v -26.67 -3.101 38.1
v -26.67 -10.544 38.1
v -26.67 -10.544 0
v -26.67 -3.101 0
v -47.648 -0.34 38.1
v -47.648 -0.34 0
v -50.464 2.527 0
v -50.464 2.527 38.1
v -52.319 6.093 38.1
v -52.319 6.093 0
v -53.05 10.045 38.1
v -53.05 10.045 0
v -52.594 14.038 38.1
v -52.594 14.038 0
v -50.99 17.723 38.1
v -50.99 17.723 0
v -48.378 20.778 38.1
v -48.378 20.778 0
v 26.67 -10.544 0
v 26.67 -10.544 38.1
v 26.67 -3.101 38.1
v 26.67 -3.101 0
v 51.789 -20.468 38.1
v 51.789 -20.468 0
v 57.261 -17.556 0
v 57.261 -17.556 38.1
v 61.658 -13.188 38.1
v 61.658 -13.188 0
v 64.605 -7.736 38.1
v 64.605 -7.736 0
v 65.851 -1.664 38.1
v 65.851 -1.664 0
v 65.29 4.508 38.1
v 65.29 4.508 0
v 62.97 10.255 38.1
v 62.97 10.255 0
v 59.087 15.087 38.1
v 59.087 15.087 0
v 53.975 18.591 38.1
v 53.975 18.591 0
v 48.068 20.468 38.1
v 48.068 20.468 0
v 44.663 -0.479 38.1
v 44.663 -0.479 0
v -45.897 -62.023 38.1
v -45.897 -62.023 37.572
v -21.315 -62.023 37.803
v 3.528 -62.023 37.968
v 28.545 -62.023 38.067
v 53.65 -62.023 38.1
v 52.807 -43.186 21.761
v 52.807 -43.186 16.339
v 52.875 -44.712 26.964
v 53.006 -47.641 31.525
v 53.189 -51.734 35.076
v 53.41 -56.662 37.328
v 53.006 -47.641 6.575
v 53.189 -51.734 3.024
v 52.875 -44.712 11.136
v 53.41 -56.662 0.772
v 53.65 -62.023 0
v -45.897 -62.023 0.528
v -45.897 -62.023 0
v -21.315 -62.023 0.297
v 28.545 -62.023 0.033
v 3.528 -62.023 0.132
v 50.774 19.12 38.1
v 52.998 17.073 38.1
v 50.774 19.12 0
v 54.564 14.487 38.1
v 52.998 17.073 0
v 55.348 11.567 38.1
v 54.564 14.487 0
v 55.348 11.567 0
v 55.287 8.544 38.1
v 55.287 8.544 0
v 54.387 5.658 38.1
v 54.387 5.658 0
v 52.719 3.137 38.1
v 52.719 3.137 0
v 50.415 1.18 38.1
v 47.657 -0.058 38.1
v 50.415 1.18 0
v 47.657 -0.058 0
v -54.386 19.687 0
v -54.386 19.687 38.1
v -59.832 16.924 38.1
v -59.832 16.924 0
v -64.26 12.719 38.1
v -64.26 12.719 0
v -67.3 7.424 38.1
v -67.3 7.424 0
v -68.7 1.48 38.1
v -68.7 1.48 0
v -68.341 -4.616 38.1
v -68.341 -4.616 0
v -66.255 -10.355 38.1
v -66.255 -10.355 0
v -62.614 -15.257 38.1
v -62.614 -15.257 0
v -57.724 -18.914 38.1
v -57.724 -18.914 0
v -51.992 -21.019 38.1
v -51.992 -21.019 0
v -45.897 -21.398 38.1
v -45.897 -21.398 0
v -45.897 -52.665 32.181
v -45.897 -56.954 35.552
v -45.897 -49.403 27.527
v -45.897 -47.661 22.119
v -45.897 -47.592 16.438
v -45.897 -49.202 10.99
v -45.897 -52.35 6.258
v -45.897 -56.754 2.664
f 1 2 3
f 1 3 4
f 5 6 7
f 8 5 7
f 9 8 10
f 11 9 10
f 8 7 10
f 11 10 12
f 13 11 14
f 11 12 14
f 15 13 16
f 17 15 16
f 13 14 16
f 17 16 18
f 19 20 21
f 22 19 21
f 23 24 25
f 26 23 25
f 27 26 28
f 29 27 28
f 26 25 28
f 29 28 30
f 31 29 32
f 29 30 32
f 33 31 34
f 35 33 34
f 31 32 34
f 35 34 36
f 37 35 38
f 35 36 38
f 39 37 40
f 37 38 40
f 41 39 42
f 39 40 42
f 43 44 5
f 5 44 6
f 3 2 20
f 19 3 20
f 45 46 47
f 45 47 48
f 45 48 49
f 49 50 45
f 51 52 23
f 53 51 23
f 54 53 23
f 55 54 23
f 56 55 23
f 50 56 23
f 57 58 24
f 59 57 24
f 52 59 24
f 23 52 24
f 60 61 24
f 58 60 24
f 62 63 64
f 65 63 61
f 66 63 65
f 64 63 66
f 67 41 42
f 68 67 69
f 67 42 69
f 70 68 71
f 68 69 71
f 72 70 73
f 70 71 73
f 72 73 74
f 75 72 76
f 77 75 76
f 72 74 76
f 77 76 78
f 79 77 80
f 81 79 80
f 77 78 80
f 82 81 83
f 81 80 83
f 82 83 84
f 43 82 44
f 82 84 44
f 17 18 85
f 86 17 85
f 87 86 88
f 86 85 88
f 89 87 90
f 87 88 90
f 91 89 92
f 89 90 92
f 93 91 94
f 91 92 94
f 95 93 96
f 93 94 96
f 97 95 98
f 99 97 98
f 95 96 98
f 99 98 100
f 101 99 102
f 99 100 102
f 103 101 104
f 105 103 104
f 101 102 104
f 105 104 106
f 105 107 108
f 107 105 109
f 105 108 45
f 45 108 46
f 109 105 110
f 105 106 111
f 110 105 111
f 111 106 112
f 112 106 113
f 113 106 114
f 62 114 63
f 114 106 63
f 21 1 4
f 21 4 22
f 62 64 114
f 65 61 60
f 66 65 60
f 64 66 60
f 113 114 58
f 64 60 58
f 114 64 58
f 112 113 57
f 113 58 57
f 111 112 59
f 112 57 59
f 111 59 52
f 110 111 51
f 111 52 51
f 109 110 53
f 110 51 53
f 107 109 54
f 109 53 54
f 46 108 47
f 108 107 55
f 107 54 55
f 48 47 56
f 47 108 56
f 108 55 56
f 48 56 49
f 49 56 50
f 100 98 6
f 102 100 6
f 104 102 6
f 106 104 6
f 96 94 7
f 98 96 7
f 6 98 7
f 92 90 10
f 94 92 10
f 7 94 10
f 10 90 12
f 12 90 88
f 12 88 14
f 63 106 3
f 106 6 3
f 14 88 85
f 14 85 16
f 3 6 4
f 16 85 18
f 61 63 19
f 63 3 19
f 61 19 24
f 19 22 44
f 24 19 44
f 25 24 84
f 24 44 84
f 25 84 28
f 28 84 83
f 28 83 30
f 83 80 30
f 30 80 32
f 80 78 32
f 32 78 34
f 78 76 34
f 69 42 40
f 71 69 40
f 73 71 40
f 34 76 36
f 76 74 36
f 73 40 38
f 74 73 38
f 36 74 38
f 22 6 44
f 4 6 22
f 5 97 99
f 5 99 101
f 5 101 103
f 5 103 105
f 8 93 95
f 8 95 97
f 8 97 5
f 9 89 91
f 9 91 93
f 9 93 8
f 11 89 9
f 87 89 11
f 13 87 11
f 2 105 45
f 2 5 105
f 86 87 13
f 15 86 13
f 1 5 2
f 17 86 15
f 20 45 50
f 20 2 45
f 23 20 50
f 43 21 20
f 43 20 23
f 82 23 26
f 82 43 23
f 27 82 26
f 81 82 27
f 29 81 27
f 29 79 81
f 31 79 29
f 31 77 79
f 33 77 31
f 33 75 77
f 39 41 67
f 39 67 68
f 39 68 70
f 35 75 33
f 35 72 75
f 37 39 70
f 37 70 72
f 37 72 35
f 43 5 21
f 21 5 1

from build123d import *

# Parameters (mm, degrees)
F1_DEPTH = 38.1
F3_DEPTH = 152.4
F4_W     = 53.3399991691
F4_H     = 7.4427900836
F5_DEPTH = 152.4


with BuildPart() as f1:
    # F0 (on Top) → F1 (new body)
    with BuildSketch(Plane.XY):
        with BuildLine():
            ThreePointArc((-47.6478643498, -0.3401276624), (-53.0503273428, 10.0446370996), (-48.3781397343, 20.7777917385))
            ThreePointArc((-48.3781397343, 20.7777917385), (-68.74194328, -1.5809564376), (-45.8972081542, -21.3980246335))
            Line((-45.8972081542, -21.3980246335), (-45.8972081542, -62.0232559741))
            Line((-45.8972081542, -62.0232559741), (53.6501146853, -62.0232559741))
            Line((53.6501146853, -62.0232559741), (51.7894178629, -20.4676743597))
            ThreePointArc((51.7894178629, -20.4676743597), (65.7973197018, 1.4426008353), (48.0680204928, 20.4676743597))
            ThreePointArc((48.0680204928, 20.4676743597), (55.2873850052, 8.5442586778), (44.6631883311, -0.4786848838))
            Line((44.6631883311, -0.4786848838), (-47.6478643498, -0.3401276624))
        make_face()
    extrude(amount=F1_DEPTH)

    # F2 (on face) → F3 (cut)
    with BuildSketch(Plane(origin=(50.7711641994, 2.2733346575, 0), x_dir=(-0.0447312803, 0.9989990553, 0), z_dir=(0.9989990553, 0.0447312803, 0))):
        with BuildLine():
            Line((-64.3610124434, 38.1), (-64.3610124434, 0))
            ThreePointArc((-64.3610124434, 0), (-45.3110124434, 19.05), (-64.3610124434, 38.1))
        make_face()
    extrude(amount=-F3_DEPTH, mode=Mode.SUBTRACT)

    # F4 (on face) → F5 (cut)
    with BuildSketch(Plane.XY.offset(38.1)):
        with Locations((0, -6.8225585856)):
            Rectangle(F4_W, F4_H)
    extrude(amount=-F5_DEPTH, mode=Mode.SUBTRACT)


solid = f1.part
